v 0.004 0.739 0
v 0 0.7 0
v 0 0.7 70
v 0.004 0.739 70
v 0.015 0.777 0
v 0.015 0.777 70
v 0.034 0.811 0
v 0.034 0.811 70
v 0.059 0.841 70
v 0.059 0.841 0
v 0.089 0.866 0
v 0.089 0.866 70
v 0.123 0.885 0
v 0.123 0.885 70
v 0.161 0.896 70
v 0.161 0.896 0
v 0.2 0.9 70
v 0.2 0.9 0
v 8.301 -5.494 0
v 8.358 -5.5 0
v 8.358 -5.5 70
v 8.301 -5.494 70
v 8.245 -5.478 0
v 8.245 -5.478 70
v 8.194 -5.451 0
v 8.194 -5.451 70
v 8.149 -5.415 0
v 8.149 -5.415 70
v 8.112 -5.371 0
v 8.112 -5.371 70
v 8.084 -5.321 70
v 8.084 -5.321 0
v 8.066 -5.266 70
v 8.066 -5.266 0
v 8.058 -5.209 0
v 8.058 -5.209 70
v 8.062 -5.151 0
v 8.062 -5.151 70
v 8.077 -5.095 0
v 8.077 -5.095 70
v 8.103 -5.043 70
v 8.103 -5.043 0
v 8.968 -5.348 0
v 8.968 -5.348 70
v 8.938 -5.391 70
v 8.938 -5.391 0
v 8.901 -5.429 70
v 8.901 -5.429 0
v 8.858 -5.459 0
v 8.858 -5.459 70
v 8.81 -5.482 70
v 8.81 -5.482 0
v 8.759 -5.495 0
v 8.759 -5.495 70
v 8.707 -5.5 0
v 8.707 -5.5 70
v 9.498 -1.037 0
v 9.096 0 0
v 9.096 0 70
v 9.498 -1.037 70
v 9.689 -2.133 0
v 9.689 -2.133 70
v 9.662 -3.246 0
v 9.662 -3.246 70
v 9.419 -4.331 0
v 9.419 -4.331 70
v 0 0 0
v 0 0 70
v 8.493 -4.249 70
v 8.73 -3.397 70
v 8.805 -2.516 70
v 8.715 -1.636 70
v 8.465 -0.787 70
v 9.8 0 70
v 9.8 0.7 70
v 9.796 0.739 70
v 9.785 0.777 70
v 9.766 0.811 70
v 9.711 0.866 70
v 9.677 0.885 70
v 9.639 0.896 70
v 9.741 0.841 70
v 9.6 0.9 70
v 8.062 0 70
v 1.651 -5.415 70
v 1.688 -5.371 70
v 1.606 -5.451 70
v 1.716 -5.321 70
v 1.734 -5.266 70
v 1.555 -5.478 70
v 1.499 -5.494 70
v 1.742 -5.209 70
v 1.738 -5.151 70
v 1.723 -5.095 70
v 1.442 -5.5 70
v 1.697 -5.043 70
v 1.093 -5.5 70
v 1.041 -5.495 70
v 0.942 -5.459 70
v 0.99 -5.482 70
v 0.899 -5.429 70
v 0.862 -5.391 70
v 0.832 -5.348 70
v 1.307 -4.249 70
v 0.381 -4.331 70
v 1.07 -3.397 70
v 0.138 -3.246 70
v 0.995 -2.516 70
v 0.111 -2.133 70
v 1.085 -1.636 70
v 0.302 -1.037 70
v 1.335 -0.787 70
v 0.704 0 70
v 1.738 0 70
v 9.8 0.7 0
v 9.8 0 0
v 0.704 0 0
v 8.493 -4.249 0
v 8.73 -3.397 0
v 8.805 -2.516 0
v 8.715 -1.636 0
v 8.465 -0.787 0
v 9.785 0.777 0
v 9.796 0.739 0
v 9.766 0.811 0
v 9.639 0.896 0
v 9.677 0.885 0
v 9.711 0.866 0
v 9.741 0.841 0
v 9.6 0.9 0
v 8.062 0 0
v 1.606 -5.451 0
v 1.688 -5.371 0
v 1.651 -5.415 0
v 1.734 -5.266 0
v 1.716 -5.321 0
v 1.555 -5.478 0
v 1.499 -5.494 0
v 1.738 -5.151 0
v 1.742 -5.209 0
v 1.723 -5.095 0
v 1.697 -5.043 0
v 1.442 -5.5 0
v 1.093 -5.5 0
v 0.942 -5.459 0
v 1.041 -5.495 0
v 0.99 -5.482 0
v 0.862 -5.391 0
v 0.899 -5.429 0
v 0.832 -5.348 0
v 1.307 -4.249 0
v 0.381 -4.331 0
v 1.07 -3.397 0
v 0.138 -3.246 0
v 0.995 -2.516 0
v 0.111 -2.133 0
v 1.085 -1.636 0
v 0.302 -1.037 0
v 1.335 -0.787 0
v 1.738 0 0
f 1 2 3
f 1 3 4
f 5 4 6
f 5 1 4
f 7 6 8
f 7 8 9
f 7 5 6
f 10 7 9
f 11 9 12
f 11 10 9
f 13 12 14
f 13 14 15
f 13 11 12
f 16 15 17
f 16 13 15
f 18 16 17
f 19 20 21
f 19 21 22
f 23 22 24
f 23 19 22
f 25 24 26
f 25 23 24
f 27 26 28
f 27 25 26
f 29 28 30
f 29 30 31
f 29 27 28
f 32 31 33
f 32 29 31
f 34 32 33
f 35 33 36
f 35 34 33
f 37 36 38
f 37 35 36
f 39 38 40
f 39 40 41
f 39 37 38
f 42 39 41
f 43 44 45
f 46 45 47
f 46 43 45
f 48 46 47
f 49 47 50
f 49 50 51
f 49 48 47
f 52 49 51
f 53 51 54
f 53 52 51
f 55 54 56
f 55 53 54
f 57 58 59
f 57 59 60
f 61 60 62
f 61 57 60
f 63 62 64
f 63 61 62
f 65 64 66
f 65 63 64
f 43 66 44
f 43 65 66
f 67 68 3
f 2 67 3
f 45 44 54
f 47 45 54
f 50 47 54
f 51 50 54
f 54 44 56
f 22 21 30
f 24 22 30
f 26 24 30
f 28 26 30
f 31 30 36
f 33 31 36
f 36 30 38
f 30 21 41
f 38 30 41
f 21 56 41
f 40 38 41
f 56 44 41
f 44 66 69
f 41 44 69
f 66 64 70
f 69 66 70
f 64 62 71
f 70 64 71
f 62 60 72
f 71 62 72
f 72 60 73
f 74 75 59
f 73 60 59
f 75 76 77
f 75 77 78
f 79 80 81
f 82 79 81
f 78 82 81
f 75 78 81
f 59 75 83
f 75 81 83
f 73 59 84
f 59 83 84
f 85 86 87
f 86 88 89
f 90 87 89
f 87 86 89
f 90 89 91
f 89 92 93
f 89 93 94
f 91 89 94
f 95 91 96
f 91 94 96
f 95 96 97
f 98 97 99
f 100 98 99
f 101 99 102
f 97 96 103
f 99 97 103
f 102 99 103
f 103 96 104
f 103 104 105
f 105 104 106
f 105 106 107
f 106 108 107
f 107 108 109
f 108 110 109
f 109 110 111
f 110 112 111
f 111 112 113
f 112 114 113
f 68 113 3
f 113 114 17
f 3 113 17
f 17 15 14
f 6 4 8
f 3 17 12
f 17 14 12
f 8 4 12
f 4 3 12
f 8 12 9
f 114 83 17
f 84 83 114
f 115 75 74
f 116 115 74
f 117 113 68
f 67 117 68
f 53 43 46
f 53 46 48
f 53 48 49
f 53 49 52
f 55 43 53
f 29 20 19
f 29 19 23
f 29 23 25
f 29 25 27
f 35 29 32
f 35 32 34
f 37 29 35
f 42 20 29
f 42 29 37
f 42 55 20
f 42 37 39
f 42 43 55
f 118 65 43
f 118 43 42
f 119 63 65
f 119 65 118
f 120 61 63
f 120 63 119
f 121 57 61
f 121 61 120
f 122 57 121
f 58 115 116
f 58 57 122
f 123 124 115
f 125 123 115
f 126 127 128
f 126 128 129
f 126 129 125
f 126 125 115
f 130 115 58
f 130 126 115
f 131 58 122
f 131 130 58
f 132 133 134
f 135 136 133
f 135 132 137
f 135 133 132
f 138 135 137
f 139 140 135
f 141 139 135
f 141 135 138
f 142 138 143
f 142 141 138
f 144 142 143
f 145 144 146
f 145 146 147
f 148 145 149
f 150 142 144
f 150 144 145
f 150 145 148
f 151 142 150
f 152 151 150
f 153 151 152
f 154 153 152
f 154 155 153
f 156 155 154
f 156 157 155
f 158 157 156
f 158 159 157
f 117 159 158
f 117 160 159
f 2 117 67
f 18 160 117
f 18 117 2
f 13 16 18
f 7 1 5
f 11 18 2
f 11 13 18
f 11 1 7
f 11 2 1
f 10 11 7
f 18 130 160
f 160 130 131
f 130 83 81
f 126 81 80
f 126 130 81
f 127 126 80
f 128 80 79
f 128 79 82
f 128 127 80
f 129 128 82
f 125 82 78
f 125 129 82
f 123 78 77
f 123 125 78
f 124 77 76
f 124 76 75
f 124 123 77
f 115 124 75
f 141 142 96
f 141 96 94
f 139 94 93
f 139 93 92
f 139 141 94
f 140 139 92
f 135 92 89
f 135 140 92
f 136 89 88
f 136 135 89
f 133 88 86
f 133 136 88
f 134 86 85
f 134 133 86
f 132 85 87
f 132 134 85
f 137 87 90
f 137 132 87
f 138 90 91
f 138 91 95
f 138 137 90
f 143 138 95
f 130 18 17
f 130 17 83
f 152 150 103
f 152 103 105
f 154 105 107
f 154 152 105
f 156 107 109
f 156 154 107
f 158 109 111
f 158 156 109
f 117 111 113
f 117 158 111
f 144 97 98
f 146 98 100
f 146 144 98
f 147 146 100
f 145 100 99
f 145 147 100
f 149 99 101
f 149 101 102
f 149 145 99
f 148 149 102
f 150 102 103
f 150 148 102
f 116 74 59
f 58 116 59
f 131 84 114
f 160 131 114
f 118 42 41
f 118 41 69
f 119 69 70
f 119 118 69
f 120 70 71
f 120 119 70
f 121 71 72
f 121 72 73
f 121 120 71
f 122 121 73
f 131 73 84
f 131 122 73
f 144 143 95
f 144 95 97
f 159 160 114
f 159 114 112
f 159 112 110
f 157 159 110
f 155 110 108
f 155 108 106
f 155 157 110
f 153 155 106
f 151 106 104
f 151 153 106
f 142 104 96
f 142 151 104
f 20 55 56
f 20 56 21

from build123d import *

# Parameters (mm, degrees)
EXTRUDE_1_DEPTH = 70


with BuildPart() as part:
    # 草图1 → 凸台-拉伸1 (new body)
    with BuildSketch(Plane.XY):
        with BuildLine():
            Line((0.2, 0.9), (9.6, 0.9))
            ThreePointArc((9.6, 0.9), (9.741421356, 0.841421356), (9.8, 0.7))
            Line((9.8, 0.7), (9.8, 0))
            Line((9.8, 0), (9.095909231, 0))
            ThreePointArc((9.095909231, 0), (9.703179683, -2.690137412), (8.967513749, -5.348033635))
            ThreePointArc((8.967513749, -5.348033635), (8.857560706, -5.459239359), (8.706580725, -5.5))
            Line((8.706580725, -5.5), (8.358309598, -5.5))
            ThreePointArc((8.358309598, -5.5), (8.096544276, -5.34655687), (8.10255289, -5.043192773))
            ThreePointArc((8.10255289, -5.043192773), (8.804655076, -2.515755891), (8.061784314, 0))
            Line((8.061784314, 0), (1.738215686, 0))
            ThreePointArc((1.738215686, 0), (0.995344924, -2.515755891), (1.69744711, -5.043192773))
            ThreePointArc((1.69744711, -5.043192773), (1.703455724, -5.34655687), (1.441690402, -5.5))
            Line((1.441690402, -5.5), (1.093419275, -5.5))
            ThreePointArc((1.093419275, -5.5), (0.942439294, -5.459239359), (0.832486251, -5.348033635))
            ThreePointArc((0.832486251, -5.348033635), (0.096820317, -2.690137412), (0.704090769, 0))
            Line((0.704090769, 0), (0, 0))
            Line((0, 0), (0, 0.7))
            ThreePointArc((0, 0.7), (0.058578644, 0.841421356), (0.2, 0.9))
        make_face()
    extrude(amount=EXTRUDE_1_DEPTH)


solid = part.part
